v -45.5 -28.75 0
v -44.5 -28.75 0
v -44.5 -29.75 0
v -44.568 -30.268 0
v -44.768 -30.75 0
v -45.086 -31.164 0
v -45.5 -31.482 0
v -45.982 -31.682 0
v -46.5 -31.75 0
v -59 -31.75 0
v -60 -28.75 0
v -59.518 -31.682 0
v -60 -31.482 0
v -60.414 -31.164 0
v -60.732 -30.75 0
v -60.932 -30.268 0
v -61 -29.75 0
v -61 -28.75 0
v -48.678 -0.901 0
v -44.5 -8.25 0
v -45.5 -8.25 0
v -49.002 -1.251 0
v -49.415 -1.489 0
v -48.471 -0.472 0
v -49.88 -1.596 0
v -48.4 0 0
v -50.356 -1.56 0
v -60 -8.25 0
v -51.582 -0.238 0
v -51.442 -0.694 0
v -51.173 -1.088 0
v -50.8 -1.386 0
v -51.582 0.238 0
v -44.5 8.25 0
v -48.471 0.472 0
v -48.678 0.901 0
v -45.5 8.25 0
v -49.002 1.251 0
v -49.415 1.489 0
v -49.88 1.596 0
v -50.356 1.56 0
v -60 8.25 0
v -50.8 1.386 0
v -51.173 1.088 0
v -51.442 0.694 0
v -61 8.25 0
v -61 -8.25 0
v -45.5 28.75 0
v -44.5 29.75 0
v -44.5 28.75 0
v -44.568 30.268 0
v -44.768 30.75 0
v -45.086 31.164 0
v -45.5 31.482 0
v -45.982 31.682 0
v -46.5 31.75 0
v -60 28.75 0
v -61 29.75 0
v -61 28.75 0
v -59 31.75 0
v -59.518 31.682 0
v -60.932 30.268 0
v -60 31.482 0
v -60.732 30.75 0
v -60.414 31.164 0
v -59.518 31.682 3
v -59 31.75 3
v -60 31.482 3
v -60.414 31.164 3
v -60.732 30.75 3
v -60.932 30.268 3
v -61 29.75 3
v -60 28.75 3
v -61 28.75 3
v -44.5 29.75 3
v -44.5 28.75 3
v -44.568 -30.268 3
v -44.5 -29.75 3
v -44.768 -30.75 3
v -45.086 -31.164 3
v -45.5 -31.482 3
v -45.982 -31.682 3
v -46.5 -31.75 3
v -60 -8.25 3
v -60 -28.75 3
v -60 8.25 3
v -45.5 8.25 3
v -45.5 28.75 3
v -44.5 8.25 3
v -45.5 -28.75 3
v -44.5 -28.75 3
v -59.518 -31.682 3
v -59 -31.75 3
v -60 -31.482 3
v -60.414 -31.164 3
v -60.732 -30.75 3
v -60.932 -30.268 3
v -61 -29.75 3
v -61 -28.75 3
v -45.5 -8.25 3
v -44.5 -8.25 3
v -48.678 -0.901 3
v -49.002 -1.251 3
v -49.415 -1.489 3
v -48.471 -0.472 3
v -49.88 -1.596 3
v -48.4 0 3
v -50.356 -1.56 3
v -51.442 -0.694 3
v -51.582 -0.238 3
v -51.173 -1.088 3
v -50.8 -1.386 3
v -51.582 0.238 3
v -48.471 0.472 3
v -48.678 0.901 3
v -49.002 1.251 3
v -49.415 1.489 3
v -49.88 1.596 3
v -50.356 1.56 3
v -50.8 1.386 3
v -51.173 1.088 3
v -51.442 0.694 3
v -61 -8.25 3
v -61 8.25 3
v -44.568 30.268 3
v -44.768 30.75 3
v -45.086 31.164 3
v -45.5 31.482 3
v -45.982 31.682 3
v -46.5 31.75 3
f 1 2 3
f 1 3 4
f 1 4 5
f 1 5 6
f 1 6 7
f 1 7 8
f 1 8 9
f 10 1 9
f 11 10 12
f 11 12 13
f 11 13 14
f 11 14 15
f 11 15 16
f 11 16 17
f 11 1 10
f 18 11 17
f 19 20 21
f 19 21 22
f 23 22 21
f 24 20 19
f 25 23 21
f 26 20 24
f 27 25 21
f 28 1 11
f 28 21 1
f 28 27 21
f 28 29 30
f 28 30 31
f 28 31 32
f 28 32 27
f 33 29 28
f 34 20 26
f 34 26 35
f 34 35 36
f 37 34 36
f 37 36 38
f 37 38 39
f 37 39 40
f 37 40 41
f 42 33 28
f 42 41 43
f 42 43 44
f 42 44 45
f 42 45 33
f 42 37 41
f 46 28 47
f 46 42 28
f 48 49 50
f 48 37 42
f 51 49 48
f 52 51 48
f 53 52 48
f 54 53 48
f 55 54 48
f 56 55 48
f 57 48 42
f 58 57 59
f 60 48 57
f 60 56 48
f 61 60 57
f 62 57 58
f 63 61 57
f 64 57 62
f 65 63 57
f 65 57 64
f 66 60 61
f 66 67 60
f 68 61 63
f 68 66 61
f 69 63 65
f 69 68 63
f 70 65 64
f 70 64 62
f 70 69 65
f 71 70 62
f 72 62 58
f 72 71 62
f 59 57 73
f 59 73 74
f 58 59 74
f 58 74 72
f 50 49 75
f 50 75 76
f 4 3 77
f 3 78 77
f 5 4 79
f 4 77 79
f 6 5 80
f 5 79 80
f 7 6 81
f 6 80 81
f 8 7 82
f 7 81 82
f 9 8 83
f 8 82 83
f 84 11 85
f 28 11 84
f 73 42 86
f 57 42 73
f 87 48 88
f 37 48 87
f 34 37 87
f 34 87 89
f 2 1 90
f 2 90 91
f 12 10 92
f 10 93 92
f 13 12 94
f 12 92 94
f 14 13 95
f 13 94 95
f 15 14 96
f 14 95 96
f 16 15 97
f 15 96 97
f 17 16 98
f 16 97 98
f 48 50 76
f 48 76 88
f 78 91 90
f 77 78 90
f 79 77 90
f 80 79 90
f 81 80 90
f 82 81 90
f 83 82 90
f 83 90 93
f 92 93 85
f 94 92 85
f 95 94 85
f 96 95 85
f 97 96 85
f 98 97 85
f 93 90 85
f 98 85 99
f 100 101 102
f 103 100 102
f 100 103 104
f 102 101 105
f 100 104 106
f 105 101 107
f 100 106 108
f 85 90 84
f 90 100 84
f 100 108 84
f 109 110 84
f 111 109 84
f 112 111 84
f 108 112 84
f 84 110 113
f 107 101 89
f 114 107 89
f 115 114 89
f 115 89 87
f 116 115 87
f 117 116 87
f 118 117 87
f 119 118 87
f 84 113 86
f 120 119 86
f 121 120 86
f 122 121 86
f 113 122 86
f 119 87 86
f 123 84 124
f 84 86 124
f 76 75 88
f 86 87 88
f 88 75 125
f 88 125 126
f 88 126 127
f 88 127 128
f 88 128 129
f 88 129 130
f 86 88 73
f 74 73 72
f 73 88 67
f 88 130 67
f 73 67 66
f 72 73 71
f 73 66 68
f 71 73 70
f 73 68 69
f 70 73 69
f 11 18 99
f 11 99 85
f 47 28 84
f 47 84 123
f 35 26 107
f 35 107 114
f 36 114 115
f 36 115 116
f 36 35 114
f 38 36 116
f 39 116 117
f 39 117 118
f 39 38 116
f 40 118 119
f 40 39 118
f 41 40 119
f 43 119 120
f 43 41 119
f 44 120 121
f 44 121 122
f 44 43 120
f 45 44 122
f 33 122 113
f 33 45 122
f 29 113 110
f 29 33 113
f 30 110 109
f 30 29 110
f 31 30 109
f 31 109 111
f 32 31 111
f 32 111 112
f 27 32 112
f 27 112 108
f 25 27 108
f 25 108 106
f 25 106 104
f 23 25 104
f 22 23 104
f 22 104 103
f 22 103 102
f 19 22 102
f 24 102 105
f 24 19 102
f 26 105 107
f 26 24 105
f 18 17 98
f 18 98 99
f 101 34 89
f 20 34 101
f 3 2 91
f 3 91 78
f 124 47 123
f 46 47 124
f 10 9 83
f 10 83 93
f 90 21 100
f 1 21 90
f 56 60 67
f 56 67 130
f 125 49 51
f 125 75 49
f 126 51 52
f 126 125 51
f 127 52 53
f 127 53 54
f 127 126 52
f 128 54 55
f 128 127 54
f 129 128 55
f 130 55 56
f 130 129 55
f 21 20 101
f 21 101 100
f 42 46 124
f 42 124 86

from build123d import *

# Parameters (mm, degrees)
SKETCH1_R           = 1.6
BOSS_EXTRUDE1_DEPTH = 3
FILLET1_R           = 2


with BuildPart() as part:
    # Sketch1 → Boss-Extrude1 (new body)
    with BuildSketch(Plane.XY):
        Polygon((-45.5, 28.75), (-45.5, 8.25), (-44.5, 8.25), (-44.5, -8.25), (-45.5, -8.25), (-45.5, -28.75), (-44.5, -28.75), (-44.5, -31.75), (-61, -31.75), (-61, -28.75), (-60, -28.75), (-60, -8.25), (-61, -8.25), (-61, 8.25), (-60, 8.25), (-60, 28.75), (-61, 28.75), (-61, 31.75), (-44.5, 31.75), (-44.5, 28.75), align=None)
        with Locations((-50, 0)):
            Circle(SKETCH1_R, mode=Mode.SUBTRACT)
    extrude(amount=BOSS_EXTRUDE1_DEPTH)

    # Fillet1
    fillet1_edges = [part.edges().sort_by_distance(p)[0] for p in [
        (-44.5, -31.75, 1.5),
        (-61, -31.75, 1.5),
        (-61, 31.75, 1.5),
        (-44.5, 31.75, 1.5),
    ]]
    fillet(fillet1_edges, radius=FILLET1_R)


solid = part.part
